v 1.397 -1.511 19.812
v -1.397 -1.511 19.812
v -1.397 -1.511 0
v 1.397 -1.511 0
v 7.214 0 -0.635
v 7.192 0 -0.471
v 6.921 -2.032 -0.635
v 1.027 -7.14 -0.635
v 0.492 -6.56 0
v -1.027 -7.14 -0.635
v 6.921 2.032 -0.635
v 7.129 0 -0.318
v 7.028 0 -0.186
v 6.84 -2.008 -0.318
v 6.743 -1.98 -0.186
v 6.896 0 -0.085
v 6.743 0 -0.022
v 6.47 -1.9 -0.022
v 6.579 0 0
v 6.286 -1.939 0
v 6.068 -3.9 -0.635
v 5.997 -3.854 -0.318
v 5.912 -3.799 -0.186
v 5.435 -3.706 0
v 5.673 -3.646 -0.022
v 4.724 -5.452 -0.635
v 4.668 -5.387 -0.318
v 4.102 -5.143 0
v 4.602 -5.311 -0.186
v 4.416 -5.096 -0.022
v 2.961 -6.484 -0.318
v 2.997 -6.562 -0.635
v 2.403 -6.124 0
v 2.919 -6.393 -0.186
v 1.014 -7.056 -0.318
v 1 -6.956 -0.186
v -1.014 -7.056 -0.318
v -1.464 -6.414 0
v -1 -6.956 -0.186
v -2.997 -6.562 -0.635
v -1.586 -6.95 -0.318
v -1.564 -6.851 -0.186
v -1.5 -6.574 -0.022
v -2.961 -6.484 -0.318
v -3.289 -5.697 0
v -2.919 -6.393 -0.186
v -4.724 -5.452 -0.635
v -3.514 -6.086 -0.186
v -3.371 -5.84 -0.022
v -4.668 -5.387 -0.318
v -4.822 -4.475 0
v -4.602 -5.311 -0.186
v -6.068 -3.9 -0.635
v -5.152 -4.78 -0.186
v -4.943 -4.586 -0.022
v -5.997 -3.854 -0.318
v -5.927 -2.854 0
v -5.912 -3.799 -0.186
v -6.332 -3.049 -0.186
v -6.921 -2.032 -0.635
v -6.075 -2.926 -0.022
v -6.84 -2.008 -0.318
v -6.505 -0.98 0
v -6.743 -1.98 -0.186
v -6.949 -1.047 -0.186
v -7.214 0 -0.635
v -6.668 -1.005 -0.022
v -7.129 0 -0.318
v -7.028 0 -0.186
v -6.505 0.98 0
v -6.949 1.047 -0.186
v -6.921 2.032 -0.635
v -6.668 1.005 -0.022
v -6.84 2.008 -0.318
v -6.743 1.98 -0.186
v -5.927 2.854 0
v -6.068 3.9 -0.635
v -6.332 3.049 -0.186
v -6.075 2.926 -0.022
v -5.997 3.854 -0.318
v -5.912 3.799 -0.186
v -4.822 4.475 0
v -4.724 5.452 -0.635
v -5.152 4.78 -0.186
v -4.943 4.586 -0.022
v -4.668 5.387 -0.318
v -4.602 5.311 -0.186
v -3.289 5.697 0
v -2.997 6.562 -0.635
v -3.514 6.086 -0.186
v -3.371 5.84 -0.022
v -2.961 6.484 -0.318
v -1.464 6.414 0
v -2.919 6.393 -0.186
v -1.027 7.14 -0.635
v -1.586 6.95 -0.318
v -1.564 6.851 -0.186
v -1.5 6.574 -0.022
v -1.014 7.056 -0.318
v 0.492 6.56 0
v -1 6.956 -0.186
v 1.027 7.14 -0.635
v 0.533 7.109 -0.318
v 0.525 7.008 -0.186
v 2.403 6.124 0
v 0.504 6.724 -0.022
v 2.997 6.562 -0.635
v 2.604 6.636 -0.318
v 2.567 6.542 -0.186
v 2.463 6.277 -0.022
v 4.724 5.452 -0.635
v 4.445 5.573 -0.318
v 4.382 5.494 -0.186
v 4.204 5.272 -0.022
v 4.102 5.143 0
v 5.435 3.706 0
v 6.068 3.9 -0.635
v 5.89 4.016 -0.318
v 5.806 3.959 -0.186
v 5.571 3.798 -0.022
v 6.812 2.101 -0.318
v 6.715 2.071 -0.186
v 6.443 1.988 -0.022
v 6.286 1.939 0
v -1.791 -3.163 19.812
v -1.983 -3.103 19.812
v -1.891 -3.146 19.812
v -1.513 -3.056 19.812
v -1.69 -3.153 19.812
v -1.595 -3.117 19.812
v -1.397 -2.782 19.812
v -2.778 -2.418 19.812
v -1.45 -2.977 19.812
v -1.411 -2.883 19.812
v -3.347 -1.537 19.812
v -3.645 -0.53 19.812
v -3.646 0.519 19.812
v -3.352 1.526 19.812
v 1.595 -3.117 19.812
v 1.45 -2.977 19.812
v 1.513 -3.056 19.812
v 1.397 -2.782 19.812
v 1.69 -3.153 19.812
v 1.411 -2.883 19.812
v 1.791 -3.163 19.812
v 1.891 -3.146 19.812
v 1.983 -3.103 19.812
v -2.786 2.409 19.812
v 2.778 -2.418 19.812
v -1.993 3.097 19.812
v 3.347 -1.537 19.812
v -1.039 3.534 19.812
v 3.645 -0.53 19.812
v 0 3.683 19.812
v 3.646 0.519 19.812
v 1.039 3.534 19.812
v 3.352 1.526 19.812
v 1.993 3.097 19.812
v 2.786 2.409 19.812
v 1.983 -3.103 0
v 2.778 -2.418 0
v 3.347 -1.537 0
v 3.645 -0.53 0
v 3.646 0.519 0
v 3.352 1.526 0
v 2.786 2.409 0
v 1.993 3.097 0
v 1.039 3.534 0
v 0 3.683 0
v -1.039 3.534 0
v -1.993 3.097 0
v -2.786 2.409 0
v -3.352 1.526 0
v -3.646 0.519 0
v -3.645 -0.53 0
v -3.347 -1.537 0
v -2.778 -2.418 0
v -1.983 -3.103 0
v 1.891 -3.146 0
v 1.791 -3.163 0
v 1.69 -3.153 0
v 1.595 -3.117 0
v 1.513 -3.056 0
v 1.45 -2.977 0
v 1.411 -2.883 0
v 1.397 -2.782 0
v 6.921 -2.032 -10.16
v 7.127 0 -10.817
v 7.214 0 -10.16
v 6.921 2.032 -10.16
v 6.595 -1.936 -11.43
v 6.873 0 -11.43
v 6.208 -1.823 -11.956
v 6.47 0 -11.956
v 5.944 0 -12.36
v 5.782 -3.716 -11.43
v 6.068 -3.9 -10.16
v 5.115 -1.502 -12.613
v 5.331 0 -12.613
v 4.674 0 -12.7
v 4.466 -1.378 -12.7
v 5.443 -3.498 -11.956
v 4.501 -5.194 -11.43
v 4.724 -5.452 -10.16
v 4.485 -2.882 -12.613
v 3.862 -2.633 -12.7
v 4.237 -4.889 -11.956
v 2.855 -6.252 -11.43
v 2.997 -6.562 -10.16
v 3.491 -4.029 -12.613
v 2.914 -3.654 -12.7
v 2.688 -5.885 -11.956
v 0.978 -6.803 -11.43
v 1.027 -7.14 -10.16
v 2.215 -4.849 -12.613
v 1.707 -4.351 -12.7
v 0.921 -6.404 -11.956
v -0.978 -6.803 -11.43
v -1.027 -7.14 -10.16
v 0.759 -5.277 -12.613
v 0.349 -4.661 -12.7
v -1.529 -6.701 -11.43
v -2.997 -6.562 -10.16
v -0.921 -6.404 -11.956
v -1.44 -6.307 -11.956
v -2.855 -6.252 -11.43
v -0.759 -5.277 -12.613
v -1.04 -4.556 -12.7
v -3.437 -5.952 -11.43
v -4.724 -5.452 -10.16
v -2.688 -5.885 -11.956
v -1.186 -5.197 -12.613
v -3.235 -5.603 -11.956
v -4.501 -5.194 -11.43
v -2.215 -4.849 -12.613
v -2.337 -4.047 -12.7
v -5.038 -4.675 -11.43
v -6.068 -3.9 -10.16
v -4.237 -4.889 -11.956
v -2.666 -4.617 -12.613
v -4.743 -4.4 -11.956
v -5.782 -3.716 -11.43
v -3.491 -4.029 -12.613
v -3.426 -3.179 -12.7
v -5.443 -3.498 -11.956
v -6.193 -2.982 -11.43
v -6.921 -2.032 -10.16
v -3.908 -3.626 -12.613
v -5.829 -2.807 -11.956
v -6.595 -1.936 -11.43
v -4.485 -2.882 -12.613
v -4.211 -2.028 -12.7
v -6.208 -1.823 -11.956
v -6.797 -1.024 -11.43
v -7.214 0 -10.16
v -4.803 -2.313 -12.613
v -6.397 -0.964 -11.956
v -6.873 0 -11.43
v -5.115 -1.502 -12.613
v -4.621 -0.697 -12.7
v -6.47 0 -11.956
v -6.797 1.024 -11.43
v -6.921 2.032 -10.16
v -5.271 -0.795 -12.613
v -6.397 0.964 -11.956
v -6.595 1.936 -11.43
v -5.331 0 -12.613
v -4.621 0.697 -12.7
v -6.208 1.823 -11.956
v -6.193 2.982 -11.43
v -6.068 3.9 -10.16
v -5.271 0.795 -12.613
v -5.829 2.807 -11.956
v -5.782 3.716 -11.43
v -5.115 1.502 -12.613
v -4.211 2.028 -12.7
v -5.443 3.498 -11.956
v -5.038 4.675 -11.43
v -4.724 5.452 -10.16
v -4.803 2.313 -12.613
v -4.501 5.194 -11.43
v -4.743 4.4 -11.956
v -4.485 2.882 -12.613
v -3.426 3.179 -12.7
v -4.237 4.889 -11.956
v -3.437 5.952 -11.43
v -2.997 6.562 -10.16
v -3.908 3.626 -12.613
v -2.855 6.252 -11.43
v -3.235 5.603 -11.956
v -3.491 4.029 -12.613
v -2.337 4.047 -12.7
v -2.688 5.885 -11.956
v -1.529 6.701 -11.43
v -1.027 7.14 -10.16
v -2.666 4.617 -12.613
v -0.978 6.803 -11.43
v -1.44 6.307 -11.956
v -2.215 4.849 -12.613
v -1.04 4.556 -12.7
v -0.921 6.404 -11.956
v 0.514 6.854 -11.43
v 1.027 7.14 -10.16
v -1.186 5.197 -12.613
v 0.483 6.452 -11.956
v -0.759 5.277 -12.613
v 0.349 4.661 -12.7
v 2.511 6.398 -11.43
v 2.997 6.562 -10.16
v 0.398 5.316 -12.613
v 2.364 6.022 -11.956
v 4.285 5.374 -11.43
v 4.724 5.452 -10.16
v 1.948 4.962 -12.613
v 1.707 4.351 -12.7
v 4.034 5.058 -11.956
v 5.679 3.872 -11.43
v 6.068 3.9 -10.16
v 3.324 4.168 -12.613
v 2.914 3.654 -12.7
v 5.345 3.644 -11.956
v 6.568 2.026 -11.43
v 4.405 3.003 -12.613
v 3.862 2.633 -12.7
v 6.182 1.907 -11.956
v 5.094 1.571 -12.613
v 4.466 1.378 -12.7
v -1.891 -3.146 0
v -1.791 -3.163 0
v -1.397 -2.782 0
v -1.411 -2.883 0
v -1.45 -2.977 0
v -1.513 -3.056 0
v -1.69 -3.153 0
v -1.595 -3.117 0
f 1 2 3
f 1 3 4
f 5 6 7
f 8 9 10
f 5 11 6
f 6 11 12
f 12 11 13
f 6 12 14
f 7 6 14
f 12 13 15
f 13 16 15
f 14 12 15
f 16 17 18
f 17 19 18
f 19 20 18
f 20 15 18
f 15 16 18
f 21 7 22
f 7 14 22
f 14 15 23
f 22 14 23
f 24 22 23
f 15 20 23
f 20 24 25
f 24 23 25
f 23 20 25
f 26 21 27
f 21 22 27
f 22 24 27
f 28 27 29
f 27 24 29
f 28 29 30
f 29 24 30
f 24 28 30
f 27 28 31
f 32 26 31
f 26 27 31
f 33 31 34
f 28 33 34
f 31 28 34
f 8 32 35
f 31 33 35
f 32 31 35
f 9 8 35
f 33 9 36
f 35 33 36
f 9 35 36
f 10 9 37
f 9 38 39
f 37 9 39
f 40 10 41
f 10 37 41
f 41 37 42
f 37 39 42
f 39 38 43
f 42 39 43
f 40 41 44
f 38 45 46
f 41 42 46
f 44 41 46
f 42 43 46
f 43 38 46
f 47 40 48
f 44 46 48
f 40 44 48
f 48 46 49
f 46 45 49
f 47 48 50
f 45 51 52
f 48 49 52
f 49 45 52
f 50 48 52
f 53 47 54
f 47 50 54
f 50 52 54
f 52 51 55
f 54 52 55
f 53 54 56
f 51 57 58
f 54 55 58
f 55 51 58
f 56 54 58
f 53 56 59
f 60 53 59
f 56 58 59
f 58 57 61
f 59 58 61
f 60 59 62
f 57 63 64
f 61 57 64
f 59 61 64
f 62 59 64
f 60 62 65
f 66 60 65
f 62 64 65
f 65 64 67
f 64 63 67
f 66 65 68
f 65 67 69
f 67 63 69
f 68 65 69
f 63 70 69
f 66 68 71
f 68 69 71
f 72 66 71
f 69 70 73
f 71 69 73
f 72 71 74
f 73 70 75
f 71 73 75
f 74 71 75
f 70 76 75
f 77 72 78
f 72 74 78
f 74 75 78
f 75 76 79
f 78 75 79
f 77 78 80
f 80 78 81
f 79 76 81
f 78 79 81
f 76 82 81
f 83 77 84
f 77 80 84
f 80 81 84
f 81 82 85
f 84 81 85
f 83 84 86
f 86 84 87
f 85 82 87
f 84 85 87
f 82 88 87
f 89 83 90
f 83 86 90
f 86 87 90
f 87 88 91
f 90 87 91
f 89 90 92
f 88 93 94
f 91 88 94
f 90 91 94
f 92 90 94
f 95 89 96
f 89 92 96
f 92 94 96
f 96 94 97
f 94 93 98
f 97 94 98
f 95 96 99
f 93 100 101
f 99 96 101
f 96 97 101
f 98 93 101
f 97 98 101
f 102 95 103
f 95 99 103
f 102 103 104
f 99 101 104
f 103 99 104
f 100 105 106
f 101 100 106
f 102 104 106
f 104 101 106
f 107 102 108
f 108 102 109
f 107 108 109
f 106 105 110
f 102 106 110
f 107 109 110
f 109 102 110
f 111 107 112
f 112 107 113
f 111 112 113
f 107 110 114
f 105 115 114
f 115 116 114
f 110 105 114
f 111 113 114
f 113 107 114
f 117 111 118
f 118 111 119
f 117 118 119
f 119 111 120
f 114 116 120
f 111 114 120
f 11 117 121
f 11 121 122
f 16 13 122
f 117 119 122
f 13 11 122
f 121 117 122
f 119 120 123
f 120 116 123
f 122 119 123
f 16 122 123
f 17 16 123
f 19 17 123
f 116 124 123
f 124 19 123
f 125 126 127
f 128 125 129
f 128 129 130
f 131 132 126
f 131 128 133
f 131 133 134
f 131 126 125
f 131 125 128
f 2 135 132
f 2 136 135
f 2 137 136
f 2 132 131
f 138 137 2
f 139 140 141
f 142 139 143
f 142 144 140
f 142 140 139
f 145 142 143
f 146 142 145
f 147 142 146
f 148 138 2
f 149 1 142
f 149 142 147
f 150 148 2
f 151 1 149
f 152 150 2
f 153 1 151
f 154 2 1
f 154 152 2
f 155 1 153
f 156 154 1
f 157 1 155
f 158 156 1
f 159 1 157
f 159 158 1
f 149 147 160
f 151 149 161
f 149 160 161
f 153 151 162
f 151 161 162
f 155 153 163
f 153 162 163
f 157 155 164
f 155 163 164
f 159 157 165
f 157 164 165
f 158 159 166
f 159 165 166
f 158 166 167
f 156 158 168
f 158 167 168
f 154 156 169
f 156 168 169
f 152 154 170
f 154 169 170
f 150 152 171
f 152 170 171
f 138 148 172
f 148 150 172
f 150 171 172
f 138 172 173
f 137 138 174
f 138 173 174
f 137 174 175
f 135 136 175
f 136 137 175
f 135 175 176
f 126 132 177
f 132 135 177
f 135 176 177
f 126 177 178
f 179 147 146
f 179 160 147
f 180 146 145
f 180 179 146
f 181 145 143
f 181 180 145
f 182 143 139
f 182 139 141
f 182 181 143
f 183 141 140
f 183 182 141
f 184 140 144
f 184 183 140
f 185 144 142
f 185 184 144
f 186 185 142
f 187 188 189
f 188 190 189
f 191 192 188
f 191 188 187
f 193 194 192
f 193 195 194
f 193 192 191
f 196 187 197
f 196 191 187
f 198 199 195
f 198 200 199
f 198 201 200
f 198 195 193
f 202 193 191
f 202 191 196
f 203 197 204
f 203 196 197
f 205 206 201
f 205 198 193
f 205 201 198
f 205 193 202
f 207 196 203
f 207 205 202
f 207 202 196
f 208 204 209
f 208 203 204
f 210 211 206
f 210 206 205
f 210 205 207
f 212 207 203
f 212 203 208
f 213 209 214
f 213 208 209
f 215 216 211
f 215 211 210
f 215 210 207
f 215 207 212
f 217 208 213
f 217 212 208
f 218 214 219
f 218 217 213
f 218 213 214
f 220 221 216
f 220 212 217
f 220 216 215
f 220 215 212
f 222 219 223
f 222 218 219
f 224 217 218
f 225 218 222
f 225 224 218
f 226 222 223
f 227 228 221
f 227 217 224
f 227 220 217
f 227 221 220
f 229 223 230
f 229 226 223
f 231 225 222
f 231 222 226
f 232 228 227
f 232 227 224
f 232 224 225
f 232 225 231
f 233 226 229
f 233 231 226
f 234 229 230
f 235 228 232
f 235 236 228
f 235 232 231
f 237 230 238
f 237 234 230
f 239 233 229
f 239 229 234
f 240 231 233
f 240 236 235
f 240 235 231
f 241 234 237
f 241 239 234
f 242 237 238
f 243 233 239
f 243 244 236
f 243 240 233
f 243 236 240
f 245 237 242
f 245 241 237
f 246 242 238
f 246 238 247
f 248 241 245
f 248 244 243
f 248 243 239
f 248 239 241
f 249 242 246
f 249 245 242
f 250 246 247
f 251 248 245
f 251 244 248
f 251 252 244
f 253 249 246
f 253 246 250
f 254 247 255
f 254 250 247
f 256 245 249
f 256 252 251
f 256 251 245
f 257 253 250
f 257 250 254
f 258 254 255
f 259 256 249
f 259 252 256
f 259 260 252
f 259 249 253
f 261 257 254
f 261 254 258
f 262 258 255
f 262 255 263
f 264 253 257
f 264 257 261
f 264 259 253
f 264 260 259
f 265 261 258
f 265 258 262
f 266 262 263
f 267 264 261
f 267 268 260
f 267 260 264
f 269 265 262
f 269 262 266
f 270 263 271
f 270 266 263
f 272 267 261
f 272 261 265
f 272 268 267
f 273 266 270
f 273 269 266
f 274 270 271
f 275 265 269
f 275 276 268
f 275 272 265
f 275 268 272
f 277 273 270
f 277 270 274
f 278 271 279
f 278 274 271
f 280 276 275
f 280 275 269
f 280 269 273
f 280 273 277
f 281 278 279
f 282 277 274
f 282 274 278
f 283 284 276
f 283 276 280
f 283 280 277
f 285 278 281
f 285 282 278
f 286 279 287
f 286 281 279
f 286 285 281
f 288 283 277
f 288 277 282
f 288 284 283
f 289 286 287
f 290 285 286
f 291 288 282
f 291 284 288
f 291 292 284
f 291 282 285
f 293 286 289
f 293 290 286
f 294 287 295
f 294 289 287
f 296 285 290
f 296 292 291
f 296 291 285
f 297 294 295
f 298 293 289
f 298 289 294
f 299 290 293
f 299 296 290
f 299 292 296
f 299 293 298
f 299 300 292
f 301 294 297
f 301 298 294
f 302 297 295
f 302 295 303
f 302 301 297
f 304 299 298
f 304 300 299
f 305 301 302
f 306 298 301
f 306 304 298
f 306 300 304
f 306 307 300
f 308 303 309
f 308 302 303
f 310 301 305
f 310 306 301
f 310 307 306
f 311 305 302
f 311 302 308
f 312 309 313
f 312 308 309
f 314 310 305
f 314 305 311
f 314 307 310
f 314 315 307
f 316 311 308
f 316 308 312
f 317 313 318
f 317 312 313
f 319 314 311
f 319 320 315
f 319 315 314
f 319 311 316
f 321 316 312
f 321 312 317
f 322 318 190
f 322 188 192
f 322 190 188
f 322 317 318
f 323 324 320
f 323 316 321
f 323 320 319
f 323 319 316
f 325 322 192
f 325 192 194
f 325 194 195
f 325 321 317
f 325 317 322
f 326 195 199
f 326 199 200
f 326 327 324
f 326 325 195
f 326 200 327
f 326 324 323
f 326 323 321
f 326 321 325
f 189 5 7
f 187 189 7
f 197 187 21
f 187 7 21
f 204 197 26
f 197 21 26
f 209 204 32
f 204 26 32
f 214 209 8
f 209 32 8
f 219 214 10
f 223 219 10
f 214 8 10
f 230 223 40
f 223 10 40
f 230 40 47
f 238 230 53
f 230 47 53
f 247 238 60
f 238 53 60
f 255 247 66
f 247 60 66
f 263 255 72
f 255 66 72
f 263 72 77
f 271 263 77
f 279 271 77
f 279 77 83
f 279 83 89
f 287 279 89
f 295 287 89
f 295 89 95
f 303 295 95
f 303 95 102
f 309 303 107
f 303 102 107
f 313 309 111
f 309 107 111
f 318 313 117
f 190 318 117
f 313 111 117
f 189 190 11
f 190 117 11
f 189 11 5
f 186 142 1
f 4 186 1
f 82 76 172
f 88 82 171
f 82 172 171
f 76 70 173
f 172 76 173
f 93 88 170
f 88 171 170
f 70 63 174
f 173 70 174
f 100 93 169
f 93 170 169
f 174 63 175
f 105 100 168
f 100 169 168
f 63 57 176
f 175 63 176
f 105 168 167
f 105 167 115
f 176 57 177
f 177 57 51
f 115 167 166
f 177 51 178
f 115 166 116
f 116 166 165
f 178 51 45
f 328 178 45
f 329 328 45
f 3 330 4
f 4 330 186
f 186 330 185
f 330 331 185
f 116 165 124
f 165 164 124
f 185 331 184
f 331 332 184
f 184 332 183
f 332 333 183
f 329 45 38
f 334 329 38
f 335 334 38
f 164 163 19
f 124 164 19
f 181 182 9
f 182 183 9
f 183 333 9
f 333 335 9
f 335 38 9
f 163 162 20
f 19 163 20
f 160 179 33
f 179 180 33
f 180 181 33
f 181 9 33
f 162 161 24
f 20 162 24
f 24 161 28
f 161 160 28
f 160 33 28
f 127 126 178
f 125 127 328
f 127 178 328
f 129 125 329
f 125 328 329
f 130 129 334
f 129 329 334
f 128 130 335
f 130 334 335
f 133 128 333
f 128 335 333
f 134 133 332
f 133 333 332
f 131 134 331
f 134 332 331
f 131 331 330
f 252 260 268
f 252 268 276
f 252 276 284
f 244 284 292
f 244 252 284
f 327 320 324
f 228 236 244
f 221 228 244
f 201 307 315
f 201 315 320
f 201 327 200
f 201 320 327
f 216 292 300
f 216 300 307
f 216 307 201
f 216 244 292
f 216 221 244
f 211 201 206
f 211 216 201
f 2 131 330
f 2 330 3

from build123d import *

# Parameters (mm, degrees)
F0_R     = 3.683
F1_DEPTH = 19.812
F2_W     = 2.794
F2_H     = 2.1717
F3_DEPTH = 25.4
F4_R     = 0.381
F5_R     = 7.2136
F6_DEPTH = 12.7
F7_R     = 2.54
F8_R     = 0.635


with BuildPart() as f1:
    # F0 (on Top) → F1 (new body)
    with BuildSketch(Plane.XY):
        Circle(F0_R)
    extrude(amount=F1_DEPTH)

    # F2 (on face) → F3 (cut)
    with BuildSketch(Plane.XY.offset(19.812)):
        with Locations((0, -2.59715)):
            Rectangle(F2_W, F2_H)
    extrude(amount=-F3_DEPTH, mode=Mode.SUBTRACT)

    # F4
    f4_edges = [f1.edges().sort_by_distance(p)[0] for p in [
        (1.397, -3.407768, 9.906),
        (-1.397, -3.407768, 9.906),
    ]]
    fillet(f4_edges, radius=F4_R)

    # F5 (on face) → F6 (join)
    with BuildSketch(Plane(origin=(0, 0, 0), x_dir=(1, 0, 0), z_dir=(0, 0, -1))):
        Circle(F5_R)
    extrude(amount=F6_DEPTH)

    # F7
    f7_edges = [f1.edges().sort_by_distance(p)[0] for p in [
        (-7.2136, 0, -12.7),
    ]]
    fillet(f7_edges, radius=F7_R)

    # F8
    f8_edges = [f1.edges().sort_by_distance(p)[0] for p in [
        (-7.2136, 0, 0),
    ]]
    fillet(f8_edges, radius=F8_R)


solid = f1.part
